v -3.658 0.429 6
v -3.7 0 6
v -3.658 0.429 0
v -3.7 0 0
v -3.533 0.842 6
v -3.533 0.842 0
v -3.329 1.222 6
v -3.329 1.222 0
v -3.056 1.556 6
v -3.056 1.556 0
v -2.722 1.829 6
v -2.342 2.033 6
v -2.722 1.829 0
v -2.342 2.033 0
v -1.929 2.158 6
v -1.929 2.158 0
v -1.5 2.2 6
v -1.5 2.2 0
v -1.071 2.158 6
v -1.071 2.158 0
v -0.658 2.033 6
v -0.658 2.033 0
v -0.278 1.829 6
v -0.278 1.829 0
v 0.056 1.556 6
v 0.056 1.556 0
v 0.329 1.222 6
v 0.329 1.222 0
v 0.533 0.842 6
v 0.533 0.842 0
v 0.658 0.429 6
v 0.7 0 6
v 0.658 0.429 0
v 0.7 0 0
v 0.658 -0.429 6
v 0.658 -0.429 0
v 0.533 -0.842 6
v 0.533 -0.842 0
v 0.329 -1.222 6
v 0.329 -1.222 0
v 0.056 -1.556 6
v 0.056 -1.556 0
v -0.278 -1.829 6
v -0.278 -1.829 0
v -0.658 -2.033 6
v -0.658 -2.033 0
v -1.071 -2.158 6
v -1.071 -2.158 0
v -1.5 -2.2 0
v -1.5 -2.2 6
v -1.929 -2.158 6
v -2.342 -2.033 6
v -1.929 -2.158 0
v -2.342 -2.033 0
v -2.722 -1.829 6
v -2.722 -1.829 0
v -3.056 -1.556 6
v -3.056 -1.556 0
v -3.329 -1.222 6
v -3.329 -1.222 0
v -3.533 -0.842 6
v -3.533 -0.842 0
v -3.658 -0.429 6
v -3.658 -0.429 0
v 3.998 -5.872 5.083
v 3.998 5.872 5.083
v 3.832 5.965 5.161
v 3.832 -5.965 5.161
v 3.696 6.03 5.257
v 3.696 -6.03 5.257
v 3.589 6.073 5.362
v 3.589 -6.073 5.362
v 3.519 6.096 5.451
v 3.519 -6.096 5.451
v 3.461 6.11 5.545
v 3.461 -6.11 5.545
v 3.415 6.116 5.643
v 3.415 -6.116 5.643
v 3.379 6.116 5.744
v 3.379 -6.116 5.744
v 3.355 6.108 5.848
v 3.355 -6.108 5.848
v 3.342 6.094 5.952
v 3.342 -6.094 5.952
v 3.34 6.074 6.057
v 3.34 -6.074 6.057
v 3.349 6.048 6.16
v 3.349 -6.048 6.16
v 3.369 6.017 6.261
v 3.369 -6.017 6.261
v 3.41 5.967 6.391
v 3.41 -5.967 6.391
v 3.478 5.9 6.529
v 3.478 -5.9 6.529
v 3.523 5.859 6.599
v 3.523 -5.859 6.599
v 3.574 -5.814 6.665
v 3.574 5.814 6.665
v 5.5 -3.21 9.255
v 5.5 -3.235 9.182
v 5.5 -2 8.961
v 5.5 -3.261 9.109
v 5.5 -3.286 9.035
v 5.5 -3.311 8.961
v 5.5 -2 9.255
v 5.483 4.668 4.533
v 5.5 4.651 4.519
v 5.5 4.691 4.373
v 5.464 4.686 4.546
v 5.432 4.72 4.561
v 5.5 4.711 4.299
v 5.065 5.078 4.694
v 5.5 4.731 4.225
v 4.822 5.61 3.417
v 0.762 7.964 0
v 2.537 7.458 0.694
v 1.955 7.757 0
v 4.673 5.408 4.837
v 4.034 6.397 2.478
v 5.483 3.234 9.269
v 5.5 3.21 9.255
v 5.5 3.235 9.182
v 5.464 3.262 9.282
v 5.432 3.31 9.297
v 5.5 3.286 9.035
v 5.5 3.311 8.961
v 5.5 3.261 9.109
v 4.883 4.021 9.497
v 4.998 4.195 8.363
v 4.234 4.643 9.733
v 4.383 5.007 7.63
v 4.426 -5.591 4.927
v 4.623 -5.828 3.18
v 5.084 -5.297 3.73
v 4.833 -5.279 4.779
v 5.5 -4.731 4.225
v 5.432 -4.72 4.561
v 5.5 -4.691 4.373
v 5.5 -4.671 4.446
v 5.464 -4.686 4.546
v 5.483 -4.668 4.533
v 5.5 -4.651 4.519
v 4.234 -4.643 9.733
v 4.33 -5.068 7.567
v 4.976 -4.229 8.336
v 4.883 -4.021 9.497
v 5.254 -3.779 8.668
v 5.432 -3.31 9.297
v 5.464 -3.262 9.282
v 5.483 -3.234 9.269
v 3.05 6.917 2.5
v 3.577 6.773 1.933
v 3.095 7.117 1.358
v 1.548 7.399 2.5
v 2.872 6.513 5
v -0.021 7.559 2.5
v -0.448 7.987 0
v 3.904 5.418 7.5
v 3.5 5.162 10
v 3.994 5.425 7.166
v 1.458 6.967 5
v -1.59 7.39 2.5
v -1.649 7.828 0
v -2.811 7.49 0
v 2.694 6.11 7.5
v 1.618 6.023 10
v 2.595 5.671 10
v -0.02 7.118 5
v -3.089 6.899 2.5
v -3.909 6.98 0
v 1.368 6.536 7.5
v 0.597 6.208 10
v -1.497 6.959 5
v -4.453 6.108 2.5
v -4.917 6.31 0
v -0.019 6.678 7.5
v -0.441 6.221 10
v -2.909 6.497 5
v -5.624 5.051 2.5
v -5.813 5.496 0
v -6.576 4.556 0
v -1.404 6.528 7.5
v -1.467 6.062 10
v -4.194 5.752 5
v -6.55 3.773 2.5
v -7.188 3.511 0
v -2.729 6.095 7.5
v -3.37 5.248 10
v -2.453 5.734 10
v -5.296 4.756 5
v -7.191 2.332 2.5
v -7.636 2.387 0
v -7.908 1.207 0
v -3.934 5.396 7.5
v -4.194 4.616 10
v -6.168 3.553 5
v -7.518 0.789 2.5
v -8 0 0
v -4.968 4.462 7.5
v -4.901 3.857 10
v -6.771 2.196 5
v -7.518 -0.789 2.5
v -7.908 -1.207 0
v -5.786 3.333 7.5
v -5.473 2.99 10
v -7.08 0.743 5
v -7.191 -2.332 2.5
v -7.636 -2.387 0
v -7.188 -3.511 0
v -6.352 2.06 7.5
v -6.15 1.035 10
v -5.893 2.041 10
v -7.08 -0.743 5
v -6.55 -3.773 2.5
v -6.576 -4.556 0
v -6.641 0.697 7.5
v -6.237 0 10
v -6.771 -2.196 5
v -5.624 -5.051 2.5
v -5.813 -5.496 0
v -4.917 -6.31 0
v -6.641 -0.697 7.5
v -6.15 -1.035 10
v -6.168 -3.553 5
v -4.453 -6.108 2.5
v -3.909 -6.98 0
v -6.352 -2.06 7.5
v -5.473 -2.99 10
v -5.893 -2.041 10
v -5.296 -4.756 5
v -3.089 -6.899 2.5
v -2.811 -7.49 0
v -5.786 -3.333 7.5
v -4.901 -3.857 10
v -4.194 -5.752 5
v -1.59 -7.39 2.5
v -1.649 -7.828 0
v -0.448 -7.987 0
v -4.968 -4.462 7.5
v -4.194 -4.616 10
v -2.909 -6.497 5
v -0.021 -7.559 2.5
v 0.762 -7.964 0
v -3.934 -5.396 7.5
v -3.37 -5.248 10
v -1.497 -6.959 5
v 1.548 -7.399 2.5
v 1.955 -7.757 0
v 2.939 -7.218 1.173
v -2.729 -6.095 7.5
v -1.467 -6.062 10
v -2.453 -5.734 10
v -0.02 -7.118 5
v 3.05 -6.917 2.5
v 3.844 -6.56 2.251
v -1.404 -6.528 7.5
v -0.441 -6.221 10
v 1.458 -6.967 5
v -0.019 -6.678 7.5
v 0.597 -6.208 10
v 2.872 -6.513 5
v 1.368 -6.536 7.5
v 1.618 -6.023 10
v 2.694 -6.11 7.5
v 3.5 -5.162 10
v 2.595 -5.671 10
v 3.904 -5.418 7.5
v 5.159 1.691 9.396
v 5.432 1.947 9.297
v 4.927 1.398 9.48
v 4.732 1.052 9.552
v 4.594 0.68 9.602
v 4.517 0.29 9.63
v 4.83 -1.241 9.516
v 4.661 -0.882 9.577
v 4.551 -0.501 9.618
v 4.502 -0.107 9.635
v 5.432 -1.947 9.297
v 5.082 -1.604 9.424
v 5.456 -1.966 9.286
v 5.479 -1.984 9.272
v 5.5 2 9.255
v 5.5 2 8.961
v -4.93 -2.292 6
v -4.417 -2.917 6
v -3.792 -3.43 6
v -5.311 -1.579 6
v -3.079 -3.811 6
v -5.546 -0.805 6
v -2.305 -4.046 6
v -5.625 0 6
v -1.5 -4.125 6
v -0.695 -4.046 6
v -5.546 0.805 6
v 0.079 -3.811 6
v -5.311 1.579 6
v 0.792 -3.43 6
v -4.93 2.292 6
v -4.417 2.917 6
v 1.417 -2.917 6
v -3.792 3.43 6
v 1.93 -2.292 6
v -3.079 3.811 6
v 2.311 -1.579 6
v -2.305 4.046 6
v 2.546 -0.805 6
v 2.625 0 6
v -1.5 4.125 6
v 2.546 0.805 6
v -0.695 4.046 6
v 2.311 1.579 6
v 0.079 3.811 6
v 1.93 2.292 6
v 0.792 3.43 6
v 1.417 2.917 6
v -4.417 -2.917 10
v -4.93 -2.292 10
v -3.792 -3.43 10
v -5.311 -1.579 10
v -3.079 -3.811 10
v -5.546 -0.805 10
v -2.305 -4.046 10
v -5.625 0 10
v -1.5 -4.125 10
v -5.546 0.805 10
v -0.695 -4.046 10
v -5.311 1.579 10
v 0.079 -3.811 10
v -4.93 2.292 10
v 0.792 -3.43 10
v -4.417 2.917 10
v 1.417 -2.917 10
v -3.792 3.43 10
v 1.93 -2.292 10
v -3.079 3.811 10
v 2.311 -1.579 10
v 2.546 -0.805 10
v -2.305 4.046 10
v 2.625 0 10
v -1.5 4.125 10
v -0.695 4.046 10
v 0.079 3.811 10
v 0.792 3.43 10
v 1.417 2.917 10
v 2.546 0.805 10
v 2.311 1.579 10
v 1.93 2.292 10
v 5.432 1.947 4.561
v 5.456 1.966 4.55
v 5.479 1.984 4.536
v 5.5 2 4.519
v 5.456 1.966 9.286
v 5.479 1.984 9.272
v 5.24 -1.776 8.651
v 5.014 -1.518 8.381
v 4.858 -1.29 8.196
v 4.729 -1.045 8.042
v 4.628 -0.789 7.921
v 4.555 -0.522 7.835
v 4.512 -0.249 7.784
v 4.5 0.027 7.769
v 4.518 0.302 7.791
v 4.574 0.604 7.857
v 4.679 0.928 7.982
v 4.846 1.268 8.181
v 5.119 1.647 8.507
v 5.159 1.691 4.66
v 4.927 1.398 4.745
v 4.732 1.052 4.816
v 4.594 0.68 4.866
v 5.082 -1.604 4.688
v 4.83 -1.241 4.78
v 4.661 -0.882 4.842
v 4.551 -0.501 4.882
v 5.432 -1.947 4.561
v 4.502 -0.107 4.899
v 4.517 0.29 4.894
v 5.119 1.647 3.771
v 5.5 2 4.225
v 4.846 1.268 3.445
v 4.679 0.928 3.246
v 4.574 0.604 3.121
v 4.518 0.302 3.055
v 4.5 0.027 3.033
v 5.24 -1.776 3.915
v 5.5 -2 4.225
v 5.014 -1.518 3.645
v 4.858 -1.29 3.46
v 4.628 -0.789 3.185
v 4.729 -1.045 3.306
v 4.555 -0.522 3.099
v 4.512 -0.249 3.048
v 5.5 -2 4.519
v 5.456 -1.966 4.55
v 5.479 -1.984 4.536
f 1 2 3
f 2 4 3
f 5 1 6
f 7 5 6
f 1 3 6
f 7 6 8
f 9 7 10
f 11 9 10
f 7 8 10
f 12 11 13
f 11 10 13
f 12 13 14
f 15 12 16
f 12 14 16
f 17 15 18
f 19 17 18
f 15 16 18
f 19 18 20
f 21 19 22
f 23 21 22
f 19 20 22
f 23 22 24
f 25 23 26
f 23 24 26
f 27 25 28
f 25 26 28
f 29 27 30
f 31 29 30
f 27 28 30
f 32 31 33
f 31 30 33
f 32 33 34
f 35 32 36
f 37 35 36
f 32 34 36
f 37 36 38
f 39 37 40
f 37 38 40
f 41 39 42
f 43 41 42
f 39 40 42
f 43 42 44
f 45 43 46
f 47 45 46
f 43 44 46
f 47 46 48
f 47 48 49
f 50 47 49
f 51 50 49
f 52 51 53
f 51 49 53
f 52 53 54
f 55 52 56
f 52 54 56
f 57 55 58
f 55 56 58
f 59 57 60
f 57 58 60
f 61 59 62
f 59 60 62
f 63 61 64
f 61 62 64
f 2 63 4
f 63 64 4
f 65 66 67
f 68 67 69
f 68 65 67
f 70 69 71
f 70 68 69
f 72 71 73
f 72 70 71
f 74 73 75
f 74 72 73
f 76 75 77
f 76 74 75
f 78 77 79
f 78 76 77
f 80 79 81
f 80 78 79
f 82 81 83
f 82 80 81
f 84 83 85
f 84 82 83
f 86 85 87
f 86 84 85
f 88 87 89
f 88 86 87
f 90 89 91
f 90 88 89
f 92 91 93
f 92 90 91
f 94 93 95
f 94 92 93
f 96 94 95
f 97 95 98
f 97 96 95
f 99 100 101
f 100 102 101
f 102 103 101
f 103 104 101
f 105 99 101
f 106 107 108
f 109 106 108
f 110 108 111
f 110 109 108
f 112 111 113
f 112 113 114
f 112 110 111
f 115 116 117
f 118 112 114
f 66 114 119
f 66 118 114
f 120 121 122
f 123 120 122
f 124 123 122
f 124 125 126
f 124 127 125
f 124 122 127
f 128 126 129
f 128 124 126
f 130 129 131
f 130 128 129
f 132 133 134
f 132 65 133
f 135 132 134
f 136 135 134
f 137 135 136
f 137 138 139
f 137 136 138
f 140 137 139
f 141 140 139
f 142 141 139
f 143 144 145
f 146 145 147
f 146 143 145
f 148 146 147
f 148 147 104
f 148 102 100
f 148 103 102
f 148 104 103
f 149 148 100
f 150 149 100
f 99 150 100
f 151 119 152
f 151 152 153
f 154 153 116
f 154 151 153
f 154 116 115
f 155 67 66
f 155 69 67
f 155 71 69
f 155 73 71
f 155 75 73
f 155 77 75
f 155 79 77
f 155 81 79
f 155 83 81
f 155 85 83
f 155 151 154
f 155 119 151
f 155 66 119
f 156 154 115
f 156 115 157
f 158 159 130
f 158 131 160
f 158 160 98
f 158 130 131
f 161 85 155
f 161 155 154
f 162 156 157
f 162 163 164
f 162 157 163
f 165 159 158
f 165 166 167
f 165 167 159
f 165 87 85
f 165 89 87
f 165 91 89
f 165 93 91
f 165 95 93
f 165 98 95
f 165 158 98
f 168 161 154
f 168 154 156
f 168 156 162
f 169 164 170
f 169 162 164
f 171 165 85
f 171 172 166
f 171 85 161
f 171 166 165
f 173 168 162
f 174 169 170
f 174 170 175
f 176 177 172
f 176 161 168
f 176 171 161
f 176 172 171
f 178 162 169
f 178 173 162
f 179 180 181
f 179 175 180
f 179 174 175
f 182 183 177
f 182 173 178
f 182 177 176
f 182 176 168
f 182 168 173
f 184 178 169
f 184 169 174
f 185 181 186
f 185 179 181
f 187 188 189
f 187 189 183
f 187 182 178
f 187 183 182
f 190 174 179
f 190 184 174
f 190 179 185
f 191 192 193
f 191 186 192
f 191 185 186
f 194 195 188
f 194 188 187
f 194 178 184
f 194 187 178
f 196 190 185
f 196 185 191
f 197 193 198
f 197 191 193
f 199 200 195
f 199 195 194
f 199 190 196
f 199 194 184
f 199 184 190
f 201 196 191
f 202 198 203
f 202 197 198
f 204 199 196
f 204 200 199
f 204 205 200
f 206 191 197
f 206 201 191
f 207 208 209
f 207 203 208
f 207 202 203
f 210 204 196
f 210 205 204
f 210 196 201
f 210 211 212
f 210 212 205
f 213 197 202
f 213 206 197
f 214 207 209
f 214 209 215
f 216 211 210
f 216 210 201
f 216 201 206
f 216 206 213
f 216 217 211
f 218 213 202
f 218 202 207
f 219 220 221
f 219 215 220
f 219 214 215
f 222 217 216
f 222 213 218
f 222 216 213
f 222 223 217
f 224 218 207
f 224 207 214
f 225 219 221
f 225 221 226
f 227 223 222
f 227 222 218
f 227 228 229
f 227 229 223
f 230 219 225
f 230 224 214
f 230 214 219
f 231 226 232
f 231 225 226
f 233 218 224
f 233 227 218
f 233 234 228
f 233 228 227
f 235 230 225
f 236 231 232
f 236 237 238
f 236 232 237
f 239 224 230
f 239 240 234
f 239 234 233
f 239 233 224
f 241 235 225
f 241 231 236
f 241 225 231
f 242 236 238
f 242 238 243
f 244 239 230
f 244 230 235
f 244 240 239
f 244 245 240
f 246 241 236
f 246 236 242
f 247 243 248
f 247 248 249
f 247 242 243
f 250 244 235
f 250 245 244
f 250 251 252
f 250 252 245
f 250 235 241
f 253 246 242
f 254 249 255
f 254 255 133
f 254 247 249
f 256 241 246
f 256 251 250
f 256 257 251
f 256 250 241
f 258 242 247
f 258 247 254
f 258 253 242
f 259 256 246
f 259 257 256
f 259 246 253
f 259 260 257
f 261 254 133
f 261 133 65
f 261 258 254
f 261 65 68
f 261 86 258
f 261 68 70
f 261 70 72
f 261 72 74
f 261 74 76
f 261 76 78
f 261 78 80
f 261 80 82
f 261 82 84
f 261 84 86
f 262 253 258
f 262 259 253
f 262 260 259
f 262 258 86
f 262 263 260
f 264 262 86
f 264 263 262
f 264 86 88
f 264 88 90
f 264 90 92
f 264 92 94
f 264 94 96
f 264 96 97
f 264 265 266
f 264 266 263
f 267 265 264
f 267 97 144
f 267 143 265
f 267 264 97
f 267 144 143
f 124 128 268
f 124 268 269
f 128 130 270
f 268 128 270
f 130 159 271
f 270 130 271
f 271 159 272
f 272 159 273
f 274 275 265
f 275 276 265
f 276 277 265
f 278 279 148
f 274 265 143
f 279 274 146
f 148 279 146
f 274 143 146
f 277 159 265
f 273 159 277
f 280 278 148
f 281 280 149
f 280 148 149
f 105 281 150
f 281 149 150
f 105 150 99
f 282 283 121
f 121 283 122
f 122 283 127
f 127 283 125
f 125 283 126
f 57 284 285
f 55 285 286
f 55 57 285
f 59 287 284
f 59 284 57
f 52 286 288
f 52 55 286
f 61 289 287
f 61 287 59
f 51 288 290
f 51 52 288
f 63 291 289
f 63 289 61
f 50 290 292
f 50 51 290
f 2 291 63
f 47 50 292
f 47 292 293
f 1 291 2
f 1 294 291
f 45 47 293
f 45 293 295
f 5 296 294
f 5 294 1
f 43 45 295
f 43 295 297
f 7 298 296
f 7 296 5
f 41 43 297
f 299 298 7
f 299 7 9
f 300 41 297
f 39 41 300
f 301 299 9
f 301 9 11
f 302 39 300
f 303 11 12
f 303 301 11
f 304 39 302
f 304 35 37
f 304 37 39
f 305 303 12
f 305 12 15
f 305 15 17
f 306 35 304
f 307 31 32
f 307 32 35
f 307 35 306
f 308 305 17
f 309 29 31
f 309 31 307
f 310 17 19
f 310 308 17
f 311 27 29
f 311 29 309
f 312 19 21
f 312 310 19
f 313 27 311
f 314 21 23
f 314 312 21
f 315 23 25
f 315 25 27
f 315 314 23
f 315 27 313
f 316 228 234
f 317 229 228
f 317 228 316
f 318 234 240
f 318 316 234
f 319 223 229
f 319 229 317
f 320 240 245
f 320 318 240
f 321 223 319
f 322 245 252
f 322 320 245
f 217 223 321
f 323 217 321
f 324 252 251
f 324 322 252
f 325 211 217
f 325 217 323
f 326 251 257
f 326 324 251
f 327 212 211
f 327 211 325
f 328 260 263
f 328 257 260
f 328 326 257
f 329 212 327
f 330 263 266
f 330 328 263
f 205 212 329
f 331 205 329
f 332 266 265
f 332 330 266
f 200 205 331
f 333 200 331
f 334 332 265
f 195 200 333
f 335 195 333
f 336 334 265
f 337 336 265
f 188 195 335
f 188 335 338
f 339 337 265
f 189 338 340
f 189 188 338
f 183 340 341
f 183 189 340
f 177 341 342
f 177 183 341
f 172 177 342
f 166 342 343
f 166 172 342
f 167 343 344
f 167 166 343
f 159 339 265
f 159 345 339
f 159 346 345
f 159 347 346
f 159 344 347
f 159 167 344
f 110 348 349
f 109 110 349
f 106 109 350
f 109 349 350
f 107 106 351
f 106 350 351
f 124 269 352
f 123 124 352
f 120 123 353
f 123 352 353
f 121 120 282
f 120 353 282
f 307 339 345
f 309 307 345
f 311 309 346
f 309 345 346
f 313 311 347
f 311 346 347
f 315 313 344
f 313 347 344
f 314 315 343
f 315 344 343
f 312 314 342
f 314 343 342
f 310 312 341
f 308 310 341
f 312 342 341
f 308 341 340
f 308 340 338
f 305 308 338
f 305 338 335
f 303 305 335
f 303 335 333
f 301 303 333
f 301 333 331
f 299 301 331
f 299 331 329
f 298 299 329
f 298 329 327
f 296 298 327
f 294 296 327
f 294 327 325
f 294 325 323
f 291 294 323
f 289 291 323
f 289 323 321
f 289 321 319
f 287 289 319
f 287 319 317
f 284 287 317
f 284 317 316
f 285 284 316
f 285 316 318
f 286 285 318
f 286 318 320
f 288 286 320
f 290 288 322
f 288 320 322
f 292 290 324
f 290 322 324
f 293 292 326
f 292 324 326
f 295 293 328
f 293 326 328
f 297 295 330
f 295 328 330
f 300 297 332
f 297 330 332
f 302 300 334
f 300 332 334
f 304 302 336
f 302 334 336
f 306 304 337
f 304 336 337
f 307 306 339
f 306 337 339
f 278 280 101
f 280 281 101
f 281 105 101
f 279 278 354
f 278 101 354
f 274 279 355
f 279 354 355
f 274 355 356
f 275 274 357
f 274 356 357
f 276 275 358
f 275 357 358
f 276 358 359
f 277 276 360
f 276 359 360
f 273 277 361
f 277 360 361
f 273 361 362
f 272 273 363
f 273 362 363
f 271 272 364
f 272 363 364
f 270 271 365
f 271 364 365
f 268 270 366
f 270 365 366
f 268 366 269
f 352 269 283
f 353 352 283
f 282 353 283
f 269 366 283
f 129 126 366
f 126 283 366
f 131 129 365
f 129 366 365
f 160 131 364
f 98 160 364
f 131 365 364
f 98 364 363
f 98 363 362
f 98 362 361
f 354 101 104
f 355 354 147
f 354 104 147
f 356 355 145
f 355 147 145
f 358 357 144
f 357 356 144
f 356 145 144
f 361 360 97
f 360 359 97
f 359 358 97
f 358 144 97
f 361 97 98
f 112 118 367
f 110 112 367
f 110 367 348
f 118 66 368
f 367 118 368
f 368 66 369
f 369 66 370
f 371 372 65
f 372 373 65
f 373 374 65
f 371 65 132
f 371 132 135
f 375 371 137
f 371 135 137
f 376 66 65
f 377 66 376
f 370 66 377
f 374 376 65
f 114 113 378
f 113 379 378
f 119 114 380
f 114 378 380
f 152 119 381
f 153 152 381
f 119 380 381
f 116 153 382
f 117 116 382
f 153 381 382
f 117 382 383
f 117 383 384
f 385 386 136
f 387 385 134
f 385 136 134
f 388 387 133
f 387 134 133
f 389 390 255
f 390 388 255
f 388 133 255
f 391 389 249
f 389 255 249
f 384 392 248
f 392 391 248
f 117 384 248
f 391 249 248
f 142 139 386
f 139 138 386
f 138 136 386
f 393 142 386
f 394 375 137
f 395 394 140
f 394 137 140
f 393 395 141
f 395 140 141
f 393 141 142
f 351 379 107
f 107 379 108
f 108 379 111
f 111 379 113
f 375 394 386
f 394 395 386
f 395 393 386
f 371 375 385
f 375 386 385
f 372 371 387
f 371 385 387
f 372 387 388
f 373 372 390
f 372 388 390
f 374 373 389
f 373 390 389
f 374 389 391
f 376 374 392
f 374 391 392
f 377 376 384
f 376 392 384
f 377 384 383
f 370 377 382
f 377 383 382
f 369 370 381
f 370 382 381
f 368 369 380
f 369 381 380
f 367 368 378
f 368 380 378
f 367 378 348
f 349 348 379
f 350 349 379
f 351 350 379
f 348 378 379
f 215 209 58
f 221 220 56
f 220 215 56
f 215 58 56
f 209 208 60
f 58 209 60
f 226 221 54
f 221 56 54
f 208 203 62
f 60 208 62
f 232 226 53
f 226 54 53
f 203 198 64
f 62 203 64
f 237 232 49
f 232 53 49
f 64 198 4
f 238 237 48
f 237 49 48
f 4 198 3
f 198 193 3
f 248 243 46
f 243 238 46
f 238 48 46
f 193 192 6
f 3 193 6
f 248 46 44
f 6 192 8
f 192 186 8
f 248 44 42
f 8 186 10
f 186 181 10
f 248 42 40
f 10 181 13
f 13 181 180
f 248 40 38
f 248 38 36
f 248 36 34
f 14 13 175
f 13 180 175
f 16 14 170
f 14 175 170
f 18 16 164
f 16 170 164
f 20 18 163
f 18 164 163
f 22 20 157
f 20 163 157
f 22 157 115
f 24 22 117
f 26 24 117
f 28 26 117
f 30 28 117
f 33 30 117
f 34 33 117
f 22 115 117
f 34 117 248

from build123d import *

# Parameters (mm, degrees)
F0_R           = 8
F1_DEPTH       = 10
F1_TAPER       = 10
F3_DEPTH       = 25
F5_D           = 4.4
F5_CBORE_D     = 8.25
F5_CBORE_DEPTH = 4
F7_D           = 5
F9_DEPTH       = 12.5
F10_R          = 1


with BuildPart() as f1:
    # F0 (on Top) → F1 (new body)
    with BuildSketch(Plane.XY):
        Circle(F0_R)
    extrude(amount=F1_DEPTH, taper=F1_TAPER)

    # F2 (on face) → F3 (cut)
    with BuildSketch(Plane(origin=(0, 0, 0), x_dir=(1, 0, 0), z_dir=(0, 0, -1))):
        with BuildLine():
            ThreePointArc((8, 0), (7.3484692283, 3.1622776602), (5.5, 5.8094750193))
            Line((5.5, 5.8094750193), (5.5, -5.8094750193))
            ThreePointArc((5.5, -5.8094750193), (7.3484692283, -3.1622776602), (8, 0))
        make_face()
    extrude(amount=-F3_DEPTH, mode=Mode.SUBTRACT)

    # F5 (through all)
    with Locations(Plane.XY.offset(10)):
        with Locations((-1.5, 0)):
            CounterBoreHole(F5_D / 2, F5_CBORE_D / 2, F5_CBORE_DEPTH)

    # F7 (through all)
    with Locations(Plane.XY.offset(10)):
        with Locations((7, 0)):
            Hole(F7_D / 2)

    # F8 (on Front) → F9 (cut, symmetric)
    with BuildSketch(Plane.XZ):
        with BuildLine():
            Line((10.4339603065, 10), (3.5, 10))
            Line((3.5, 10), (5.4315959713, 9.2969565618))
            ThreePointArc((5.4315959713, 9.2969565618), (5.5563771079, 9.1607818467), (5.5164008313, 8.9804605157))
            Line((5.5164008313, 8.9804605157), (2.6557981563, 5.5713270008))
            Line((2.6557981563, 5.5713270008), (5.4315959713, 4.5610192198))
            ThreePointArc((5.4315959713, 4.5610192198), (5.5563771079, 4.4248445046), (5.5164008313, 4.2445231737))
            Line((5.5164008313, 4.2445231737), (0.7803240521, -1.3997133427))
            Line((0.7803240521, -1.3997133427), (10.4339603065, -1.3997133427))
            Line((10.4339603065, -1.3997133427), (10.4339603065, 10))
        make_face()
    extrude(amount=F9_DEPTH, both=True, mode=Mode.SUBTRACT)

    # F10
    f10_edges = [f1.edges().sort_by_distance(p)[0] for p in [
        (2.655798, 0, 5.571327),
    ]]
    fillet(f10_edges, radius=F10_R)


solid = f1.part
